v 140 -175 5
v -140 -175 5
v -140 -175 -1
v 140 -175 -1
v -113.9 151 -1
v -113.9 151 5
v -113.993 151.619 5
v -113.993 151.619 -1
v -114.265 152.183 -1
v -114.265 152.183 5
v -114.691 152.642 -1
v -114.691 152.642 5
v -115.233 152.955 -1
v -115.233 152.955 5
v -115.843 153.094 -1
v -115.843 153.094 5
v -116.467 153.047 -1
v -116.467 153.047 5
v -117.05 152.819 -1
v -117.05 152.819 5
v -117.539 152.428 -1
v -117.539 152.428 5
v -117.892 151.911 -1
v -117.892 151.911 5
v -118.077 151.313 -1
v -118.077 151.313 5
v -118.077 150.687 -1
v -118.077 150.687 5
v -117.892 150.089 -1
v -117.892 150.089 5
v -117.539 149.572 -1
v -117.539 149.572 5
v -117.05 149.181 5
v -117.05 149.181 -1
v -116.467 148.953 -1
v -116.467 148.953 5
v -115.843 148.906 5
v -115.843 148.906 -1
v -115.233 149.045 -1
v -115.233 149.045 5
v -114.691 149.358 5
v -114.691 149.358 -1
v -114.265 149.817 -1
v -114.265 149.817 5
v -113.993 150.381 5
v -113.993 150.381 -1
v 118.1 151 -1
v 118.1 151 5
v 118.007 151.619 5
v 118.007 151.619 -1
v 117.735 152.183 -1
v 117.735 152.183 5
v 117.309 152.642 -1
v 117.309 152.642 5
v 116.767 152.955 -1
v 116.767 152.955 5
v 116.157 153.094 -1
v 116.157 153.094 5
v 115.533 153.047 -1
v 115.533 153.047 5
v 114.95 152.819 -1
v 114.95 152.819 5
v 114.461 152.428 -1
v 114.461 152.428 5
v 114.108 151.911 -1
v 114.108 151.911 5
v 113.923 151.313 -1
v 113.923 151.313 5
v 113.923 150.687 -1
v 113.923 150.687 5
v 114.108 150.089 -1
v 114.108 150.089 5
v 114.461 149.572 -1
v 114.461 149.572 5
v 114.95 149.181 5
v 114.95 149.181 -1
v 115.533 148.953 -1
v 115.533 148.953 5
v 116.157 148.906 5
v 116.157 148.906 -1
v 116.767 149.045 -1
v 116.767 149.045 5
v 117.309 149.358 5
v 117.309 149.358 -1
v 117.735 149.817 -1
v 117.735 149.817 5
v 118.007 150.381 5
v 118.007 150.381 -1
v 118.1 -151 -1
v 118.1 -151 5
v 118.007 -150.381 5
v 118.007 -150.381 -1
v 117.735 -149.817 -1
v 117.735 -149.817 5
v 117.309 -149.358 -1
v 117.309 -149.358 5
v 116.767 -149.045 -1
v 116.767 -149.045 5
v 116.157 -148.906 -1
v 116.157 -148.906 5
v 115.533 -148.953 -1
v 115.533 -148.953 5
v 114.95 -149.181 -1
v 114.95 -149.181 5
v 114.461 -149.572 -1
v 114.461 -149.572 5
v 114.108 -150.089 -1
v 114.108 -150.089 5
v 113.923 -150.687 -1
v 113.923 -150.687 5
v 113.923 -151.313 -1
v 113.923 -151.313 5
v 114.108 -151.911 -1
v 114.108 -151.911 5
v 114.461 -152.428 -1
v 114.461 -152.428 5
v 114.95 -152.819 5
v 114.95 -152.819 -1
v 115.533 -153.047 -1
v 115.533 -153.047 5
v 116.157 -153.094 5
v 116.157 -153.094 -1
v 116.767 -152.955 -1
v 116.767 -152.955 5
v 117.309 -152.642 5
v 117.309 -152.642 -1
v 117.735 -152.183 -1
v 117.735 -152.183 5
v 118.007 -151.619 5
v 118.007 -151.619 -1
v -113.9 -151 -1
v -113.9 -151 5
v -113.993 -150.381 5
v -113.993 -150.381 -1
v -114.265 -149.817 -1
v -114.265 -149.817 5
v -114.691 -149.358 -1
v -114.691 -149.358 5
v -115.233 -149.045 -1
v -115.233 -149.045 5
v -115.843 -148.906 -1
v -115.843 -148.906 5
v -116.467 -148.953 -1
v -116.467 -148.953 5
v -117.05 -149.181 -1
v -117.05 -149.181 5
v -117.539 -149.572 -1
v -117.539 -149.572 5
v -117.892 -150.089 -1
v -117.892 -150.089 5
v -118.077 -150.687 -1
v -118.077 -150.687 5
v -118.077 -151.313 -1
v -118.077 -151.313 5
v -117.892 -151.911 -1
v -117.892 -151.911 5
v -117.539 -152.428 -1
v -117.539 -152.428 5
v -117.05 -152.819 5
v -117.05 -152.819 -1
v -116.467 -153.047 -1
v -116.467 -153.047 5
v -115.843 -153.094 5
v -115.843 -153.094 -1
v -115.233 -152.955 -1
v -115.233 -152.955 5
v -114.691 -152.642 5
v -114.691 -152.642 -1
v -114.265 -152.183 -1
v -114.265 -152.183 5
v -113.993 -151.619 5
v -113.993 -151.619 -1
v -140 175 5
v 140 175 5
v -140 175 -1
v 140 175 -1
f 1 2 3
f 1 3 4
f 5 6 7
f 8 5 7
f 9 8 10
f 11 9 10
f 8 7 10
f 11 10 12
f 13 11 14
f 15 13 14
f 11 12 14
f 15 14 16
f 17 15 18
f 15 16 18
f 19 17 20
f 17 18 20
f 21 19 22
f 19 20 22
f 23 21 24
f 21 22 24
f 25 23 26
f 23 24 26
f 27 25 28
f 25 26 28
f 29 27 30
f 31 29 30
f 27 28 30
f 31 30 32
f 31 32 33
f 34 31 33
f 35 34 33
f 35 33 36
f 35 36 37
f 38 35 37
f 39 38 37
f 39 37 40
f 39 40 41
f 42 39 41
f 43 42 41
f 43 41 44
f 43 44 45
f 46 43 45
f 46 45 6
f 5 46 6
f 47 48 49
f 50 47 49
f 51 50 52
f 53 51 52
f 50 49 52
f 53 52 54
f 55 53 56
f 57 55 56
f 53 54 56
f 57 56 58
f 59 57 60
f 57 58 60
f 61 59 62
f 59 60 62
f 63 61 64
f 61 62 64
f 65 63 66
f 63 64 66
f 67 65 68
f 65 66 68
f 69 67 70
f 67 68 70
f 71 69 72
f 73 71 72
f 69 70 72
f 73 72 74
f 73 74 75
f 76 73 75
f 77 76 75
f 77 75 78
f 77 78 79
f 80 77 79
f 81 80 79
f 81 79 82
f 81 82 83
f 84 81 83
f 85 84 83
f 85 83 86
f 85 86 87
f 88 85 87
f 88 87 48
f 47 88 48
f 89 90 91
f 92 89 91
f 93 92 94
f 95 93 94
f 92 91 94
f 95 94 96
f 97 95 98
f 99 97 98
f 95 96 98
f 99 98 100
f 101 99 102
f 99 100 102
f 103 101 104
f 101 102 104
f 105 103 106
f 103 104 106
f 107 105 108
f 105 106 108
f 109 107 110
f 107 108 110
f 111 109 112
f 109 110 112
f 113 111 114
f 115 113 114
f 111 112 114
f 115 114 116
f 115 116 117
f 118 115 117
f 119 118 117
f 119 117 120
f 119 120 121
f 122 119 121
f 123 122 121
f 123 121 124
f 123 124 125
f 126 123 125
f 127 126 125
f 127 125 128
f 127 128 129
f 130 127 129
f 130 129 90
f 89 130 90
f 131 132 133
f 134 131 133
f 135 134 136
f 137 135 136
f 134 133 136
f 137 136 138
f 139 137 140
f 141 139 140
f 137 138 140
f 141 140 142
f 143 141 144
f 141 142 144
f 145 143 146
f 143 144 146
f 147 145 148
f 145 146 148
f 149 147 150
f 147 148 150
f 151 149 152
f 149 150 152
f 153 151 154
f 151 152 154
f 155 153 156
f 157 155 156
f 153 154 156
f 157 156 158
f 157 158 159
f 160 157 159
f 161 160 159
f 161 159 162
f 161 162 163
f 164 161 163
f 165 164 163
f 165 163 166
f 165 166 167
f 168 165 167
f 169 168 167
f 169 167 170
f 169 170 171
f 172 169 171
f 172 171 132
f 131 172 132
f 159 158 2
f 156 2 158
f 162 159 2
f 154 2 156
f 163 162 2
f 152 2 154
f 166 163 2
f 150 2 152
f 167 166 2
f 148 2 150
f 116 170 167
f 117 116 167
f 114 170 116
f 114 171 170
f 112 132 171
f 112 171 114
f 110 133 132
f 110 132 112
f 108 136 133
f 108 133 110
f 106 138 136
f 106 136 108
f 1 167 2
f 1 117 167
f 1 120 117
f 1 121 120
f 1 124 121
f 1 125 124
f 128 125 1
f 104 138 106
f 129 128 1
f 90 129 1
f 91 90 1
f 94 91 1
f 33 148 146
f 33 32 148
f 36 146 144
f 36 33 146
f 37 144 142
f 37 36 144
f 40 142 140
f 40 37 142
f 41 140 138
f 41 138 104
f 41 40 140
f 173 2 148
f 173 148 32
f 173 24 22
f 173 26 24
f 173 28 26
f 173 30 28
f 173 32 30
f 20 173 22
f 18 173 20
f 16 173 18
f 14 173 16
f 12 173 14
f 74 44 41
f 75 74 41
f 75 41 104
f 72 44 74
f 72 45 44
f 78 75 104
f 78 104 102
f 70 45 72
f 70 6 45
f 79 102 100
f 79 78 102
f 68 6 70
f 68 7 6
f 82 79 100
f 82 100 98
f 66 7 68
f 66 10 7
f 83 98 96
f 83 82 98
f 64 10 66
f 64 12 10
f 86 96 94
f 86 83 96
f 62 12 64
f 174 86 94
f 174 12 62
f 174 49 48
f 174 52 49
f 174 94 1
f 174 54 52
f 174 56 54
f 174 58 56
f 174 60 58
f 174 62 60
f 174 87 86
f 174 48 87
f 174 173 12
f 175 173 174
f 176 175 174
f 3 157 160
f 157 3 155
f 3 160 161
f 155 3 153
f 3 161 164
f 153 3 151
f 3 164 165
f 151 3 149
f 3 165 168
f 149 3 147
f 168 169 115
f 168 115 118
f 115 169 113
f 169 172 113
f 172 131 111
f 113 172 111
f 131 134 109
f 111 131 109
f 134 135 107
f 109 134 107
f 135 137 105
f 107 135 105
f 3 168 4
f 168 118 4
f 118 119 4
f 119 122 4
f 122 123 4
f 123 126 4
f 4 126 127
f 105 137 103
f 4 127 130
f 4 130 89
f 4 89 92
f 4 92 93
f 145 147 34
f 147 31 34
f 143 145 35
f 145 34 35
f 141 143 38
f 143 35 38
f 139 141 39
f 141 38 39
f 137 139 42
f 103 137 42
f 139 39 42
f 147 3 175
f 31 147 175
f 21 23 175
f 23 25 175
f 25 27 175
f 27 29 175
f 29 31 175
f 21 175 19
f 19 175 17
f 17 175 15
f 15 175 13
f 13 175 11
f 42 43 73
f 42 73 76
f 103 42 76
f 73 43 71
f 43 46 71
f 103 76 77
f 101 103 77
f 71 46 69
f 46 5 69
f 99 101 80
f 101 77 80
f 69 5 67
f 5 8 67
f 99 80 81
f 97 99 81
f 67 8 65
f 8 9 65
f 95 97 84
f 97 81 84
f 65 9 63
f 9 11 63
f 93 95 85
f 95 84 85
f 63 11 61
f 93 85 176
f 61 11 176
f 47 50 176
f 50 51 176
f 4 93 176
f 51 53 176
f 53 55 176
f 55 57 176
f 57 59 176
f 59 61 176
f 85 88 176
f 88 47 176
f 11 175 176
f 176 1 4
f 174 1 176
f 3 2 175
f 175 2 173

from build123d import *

# Parameters (mm, degrees)
ESBO_O1_W                    = 280
ESBO_O1_H                    = 350
RESSALTO_EXTRUS_O1_DEPTH     = 6
FURO_DE_DI_METRO_4_2_4_2_1_D = 4.2


with BuildPart() as part:
    # Esboço1 → Ressalto-extrusão1 (new body)
    with BuildSketch(Plane.XY.offset(5)):
        Rectangle(ESBO_O1_W, ESBO_O1_H)
    extrude(amount=-RESSALTO_EXTRUS_O1_DEPTH)

    # Furo de diâmetro Ø4.2 (4.2)1 (through all)
    with Locations(Plane(origin=(0, 0, -1), x_dir=(-1, 0, 0), z_dir=(0, 0, -1))):
        with Locations((-116, 151), (-116, -151), (116, -151), (116, 151)):
            Hole(FURO_DE_DI_METRO_4_2_4_2_1_D / 2)


solid = part.part
